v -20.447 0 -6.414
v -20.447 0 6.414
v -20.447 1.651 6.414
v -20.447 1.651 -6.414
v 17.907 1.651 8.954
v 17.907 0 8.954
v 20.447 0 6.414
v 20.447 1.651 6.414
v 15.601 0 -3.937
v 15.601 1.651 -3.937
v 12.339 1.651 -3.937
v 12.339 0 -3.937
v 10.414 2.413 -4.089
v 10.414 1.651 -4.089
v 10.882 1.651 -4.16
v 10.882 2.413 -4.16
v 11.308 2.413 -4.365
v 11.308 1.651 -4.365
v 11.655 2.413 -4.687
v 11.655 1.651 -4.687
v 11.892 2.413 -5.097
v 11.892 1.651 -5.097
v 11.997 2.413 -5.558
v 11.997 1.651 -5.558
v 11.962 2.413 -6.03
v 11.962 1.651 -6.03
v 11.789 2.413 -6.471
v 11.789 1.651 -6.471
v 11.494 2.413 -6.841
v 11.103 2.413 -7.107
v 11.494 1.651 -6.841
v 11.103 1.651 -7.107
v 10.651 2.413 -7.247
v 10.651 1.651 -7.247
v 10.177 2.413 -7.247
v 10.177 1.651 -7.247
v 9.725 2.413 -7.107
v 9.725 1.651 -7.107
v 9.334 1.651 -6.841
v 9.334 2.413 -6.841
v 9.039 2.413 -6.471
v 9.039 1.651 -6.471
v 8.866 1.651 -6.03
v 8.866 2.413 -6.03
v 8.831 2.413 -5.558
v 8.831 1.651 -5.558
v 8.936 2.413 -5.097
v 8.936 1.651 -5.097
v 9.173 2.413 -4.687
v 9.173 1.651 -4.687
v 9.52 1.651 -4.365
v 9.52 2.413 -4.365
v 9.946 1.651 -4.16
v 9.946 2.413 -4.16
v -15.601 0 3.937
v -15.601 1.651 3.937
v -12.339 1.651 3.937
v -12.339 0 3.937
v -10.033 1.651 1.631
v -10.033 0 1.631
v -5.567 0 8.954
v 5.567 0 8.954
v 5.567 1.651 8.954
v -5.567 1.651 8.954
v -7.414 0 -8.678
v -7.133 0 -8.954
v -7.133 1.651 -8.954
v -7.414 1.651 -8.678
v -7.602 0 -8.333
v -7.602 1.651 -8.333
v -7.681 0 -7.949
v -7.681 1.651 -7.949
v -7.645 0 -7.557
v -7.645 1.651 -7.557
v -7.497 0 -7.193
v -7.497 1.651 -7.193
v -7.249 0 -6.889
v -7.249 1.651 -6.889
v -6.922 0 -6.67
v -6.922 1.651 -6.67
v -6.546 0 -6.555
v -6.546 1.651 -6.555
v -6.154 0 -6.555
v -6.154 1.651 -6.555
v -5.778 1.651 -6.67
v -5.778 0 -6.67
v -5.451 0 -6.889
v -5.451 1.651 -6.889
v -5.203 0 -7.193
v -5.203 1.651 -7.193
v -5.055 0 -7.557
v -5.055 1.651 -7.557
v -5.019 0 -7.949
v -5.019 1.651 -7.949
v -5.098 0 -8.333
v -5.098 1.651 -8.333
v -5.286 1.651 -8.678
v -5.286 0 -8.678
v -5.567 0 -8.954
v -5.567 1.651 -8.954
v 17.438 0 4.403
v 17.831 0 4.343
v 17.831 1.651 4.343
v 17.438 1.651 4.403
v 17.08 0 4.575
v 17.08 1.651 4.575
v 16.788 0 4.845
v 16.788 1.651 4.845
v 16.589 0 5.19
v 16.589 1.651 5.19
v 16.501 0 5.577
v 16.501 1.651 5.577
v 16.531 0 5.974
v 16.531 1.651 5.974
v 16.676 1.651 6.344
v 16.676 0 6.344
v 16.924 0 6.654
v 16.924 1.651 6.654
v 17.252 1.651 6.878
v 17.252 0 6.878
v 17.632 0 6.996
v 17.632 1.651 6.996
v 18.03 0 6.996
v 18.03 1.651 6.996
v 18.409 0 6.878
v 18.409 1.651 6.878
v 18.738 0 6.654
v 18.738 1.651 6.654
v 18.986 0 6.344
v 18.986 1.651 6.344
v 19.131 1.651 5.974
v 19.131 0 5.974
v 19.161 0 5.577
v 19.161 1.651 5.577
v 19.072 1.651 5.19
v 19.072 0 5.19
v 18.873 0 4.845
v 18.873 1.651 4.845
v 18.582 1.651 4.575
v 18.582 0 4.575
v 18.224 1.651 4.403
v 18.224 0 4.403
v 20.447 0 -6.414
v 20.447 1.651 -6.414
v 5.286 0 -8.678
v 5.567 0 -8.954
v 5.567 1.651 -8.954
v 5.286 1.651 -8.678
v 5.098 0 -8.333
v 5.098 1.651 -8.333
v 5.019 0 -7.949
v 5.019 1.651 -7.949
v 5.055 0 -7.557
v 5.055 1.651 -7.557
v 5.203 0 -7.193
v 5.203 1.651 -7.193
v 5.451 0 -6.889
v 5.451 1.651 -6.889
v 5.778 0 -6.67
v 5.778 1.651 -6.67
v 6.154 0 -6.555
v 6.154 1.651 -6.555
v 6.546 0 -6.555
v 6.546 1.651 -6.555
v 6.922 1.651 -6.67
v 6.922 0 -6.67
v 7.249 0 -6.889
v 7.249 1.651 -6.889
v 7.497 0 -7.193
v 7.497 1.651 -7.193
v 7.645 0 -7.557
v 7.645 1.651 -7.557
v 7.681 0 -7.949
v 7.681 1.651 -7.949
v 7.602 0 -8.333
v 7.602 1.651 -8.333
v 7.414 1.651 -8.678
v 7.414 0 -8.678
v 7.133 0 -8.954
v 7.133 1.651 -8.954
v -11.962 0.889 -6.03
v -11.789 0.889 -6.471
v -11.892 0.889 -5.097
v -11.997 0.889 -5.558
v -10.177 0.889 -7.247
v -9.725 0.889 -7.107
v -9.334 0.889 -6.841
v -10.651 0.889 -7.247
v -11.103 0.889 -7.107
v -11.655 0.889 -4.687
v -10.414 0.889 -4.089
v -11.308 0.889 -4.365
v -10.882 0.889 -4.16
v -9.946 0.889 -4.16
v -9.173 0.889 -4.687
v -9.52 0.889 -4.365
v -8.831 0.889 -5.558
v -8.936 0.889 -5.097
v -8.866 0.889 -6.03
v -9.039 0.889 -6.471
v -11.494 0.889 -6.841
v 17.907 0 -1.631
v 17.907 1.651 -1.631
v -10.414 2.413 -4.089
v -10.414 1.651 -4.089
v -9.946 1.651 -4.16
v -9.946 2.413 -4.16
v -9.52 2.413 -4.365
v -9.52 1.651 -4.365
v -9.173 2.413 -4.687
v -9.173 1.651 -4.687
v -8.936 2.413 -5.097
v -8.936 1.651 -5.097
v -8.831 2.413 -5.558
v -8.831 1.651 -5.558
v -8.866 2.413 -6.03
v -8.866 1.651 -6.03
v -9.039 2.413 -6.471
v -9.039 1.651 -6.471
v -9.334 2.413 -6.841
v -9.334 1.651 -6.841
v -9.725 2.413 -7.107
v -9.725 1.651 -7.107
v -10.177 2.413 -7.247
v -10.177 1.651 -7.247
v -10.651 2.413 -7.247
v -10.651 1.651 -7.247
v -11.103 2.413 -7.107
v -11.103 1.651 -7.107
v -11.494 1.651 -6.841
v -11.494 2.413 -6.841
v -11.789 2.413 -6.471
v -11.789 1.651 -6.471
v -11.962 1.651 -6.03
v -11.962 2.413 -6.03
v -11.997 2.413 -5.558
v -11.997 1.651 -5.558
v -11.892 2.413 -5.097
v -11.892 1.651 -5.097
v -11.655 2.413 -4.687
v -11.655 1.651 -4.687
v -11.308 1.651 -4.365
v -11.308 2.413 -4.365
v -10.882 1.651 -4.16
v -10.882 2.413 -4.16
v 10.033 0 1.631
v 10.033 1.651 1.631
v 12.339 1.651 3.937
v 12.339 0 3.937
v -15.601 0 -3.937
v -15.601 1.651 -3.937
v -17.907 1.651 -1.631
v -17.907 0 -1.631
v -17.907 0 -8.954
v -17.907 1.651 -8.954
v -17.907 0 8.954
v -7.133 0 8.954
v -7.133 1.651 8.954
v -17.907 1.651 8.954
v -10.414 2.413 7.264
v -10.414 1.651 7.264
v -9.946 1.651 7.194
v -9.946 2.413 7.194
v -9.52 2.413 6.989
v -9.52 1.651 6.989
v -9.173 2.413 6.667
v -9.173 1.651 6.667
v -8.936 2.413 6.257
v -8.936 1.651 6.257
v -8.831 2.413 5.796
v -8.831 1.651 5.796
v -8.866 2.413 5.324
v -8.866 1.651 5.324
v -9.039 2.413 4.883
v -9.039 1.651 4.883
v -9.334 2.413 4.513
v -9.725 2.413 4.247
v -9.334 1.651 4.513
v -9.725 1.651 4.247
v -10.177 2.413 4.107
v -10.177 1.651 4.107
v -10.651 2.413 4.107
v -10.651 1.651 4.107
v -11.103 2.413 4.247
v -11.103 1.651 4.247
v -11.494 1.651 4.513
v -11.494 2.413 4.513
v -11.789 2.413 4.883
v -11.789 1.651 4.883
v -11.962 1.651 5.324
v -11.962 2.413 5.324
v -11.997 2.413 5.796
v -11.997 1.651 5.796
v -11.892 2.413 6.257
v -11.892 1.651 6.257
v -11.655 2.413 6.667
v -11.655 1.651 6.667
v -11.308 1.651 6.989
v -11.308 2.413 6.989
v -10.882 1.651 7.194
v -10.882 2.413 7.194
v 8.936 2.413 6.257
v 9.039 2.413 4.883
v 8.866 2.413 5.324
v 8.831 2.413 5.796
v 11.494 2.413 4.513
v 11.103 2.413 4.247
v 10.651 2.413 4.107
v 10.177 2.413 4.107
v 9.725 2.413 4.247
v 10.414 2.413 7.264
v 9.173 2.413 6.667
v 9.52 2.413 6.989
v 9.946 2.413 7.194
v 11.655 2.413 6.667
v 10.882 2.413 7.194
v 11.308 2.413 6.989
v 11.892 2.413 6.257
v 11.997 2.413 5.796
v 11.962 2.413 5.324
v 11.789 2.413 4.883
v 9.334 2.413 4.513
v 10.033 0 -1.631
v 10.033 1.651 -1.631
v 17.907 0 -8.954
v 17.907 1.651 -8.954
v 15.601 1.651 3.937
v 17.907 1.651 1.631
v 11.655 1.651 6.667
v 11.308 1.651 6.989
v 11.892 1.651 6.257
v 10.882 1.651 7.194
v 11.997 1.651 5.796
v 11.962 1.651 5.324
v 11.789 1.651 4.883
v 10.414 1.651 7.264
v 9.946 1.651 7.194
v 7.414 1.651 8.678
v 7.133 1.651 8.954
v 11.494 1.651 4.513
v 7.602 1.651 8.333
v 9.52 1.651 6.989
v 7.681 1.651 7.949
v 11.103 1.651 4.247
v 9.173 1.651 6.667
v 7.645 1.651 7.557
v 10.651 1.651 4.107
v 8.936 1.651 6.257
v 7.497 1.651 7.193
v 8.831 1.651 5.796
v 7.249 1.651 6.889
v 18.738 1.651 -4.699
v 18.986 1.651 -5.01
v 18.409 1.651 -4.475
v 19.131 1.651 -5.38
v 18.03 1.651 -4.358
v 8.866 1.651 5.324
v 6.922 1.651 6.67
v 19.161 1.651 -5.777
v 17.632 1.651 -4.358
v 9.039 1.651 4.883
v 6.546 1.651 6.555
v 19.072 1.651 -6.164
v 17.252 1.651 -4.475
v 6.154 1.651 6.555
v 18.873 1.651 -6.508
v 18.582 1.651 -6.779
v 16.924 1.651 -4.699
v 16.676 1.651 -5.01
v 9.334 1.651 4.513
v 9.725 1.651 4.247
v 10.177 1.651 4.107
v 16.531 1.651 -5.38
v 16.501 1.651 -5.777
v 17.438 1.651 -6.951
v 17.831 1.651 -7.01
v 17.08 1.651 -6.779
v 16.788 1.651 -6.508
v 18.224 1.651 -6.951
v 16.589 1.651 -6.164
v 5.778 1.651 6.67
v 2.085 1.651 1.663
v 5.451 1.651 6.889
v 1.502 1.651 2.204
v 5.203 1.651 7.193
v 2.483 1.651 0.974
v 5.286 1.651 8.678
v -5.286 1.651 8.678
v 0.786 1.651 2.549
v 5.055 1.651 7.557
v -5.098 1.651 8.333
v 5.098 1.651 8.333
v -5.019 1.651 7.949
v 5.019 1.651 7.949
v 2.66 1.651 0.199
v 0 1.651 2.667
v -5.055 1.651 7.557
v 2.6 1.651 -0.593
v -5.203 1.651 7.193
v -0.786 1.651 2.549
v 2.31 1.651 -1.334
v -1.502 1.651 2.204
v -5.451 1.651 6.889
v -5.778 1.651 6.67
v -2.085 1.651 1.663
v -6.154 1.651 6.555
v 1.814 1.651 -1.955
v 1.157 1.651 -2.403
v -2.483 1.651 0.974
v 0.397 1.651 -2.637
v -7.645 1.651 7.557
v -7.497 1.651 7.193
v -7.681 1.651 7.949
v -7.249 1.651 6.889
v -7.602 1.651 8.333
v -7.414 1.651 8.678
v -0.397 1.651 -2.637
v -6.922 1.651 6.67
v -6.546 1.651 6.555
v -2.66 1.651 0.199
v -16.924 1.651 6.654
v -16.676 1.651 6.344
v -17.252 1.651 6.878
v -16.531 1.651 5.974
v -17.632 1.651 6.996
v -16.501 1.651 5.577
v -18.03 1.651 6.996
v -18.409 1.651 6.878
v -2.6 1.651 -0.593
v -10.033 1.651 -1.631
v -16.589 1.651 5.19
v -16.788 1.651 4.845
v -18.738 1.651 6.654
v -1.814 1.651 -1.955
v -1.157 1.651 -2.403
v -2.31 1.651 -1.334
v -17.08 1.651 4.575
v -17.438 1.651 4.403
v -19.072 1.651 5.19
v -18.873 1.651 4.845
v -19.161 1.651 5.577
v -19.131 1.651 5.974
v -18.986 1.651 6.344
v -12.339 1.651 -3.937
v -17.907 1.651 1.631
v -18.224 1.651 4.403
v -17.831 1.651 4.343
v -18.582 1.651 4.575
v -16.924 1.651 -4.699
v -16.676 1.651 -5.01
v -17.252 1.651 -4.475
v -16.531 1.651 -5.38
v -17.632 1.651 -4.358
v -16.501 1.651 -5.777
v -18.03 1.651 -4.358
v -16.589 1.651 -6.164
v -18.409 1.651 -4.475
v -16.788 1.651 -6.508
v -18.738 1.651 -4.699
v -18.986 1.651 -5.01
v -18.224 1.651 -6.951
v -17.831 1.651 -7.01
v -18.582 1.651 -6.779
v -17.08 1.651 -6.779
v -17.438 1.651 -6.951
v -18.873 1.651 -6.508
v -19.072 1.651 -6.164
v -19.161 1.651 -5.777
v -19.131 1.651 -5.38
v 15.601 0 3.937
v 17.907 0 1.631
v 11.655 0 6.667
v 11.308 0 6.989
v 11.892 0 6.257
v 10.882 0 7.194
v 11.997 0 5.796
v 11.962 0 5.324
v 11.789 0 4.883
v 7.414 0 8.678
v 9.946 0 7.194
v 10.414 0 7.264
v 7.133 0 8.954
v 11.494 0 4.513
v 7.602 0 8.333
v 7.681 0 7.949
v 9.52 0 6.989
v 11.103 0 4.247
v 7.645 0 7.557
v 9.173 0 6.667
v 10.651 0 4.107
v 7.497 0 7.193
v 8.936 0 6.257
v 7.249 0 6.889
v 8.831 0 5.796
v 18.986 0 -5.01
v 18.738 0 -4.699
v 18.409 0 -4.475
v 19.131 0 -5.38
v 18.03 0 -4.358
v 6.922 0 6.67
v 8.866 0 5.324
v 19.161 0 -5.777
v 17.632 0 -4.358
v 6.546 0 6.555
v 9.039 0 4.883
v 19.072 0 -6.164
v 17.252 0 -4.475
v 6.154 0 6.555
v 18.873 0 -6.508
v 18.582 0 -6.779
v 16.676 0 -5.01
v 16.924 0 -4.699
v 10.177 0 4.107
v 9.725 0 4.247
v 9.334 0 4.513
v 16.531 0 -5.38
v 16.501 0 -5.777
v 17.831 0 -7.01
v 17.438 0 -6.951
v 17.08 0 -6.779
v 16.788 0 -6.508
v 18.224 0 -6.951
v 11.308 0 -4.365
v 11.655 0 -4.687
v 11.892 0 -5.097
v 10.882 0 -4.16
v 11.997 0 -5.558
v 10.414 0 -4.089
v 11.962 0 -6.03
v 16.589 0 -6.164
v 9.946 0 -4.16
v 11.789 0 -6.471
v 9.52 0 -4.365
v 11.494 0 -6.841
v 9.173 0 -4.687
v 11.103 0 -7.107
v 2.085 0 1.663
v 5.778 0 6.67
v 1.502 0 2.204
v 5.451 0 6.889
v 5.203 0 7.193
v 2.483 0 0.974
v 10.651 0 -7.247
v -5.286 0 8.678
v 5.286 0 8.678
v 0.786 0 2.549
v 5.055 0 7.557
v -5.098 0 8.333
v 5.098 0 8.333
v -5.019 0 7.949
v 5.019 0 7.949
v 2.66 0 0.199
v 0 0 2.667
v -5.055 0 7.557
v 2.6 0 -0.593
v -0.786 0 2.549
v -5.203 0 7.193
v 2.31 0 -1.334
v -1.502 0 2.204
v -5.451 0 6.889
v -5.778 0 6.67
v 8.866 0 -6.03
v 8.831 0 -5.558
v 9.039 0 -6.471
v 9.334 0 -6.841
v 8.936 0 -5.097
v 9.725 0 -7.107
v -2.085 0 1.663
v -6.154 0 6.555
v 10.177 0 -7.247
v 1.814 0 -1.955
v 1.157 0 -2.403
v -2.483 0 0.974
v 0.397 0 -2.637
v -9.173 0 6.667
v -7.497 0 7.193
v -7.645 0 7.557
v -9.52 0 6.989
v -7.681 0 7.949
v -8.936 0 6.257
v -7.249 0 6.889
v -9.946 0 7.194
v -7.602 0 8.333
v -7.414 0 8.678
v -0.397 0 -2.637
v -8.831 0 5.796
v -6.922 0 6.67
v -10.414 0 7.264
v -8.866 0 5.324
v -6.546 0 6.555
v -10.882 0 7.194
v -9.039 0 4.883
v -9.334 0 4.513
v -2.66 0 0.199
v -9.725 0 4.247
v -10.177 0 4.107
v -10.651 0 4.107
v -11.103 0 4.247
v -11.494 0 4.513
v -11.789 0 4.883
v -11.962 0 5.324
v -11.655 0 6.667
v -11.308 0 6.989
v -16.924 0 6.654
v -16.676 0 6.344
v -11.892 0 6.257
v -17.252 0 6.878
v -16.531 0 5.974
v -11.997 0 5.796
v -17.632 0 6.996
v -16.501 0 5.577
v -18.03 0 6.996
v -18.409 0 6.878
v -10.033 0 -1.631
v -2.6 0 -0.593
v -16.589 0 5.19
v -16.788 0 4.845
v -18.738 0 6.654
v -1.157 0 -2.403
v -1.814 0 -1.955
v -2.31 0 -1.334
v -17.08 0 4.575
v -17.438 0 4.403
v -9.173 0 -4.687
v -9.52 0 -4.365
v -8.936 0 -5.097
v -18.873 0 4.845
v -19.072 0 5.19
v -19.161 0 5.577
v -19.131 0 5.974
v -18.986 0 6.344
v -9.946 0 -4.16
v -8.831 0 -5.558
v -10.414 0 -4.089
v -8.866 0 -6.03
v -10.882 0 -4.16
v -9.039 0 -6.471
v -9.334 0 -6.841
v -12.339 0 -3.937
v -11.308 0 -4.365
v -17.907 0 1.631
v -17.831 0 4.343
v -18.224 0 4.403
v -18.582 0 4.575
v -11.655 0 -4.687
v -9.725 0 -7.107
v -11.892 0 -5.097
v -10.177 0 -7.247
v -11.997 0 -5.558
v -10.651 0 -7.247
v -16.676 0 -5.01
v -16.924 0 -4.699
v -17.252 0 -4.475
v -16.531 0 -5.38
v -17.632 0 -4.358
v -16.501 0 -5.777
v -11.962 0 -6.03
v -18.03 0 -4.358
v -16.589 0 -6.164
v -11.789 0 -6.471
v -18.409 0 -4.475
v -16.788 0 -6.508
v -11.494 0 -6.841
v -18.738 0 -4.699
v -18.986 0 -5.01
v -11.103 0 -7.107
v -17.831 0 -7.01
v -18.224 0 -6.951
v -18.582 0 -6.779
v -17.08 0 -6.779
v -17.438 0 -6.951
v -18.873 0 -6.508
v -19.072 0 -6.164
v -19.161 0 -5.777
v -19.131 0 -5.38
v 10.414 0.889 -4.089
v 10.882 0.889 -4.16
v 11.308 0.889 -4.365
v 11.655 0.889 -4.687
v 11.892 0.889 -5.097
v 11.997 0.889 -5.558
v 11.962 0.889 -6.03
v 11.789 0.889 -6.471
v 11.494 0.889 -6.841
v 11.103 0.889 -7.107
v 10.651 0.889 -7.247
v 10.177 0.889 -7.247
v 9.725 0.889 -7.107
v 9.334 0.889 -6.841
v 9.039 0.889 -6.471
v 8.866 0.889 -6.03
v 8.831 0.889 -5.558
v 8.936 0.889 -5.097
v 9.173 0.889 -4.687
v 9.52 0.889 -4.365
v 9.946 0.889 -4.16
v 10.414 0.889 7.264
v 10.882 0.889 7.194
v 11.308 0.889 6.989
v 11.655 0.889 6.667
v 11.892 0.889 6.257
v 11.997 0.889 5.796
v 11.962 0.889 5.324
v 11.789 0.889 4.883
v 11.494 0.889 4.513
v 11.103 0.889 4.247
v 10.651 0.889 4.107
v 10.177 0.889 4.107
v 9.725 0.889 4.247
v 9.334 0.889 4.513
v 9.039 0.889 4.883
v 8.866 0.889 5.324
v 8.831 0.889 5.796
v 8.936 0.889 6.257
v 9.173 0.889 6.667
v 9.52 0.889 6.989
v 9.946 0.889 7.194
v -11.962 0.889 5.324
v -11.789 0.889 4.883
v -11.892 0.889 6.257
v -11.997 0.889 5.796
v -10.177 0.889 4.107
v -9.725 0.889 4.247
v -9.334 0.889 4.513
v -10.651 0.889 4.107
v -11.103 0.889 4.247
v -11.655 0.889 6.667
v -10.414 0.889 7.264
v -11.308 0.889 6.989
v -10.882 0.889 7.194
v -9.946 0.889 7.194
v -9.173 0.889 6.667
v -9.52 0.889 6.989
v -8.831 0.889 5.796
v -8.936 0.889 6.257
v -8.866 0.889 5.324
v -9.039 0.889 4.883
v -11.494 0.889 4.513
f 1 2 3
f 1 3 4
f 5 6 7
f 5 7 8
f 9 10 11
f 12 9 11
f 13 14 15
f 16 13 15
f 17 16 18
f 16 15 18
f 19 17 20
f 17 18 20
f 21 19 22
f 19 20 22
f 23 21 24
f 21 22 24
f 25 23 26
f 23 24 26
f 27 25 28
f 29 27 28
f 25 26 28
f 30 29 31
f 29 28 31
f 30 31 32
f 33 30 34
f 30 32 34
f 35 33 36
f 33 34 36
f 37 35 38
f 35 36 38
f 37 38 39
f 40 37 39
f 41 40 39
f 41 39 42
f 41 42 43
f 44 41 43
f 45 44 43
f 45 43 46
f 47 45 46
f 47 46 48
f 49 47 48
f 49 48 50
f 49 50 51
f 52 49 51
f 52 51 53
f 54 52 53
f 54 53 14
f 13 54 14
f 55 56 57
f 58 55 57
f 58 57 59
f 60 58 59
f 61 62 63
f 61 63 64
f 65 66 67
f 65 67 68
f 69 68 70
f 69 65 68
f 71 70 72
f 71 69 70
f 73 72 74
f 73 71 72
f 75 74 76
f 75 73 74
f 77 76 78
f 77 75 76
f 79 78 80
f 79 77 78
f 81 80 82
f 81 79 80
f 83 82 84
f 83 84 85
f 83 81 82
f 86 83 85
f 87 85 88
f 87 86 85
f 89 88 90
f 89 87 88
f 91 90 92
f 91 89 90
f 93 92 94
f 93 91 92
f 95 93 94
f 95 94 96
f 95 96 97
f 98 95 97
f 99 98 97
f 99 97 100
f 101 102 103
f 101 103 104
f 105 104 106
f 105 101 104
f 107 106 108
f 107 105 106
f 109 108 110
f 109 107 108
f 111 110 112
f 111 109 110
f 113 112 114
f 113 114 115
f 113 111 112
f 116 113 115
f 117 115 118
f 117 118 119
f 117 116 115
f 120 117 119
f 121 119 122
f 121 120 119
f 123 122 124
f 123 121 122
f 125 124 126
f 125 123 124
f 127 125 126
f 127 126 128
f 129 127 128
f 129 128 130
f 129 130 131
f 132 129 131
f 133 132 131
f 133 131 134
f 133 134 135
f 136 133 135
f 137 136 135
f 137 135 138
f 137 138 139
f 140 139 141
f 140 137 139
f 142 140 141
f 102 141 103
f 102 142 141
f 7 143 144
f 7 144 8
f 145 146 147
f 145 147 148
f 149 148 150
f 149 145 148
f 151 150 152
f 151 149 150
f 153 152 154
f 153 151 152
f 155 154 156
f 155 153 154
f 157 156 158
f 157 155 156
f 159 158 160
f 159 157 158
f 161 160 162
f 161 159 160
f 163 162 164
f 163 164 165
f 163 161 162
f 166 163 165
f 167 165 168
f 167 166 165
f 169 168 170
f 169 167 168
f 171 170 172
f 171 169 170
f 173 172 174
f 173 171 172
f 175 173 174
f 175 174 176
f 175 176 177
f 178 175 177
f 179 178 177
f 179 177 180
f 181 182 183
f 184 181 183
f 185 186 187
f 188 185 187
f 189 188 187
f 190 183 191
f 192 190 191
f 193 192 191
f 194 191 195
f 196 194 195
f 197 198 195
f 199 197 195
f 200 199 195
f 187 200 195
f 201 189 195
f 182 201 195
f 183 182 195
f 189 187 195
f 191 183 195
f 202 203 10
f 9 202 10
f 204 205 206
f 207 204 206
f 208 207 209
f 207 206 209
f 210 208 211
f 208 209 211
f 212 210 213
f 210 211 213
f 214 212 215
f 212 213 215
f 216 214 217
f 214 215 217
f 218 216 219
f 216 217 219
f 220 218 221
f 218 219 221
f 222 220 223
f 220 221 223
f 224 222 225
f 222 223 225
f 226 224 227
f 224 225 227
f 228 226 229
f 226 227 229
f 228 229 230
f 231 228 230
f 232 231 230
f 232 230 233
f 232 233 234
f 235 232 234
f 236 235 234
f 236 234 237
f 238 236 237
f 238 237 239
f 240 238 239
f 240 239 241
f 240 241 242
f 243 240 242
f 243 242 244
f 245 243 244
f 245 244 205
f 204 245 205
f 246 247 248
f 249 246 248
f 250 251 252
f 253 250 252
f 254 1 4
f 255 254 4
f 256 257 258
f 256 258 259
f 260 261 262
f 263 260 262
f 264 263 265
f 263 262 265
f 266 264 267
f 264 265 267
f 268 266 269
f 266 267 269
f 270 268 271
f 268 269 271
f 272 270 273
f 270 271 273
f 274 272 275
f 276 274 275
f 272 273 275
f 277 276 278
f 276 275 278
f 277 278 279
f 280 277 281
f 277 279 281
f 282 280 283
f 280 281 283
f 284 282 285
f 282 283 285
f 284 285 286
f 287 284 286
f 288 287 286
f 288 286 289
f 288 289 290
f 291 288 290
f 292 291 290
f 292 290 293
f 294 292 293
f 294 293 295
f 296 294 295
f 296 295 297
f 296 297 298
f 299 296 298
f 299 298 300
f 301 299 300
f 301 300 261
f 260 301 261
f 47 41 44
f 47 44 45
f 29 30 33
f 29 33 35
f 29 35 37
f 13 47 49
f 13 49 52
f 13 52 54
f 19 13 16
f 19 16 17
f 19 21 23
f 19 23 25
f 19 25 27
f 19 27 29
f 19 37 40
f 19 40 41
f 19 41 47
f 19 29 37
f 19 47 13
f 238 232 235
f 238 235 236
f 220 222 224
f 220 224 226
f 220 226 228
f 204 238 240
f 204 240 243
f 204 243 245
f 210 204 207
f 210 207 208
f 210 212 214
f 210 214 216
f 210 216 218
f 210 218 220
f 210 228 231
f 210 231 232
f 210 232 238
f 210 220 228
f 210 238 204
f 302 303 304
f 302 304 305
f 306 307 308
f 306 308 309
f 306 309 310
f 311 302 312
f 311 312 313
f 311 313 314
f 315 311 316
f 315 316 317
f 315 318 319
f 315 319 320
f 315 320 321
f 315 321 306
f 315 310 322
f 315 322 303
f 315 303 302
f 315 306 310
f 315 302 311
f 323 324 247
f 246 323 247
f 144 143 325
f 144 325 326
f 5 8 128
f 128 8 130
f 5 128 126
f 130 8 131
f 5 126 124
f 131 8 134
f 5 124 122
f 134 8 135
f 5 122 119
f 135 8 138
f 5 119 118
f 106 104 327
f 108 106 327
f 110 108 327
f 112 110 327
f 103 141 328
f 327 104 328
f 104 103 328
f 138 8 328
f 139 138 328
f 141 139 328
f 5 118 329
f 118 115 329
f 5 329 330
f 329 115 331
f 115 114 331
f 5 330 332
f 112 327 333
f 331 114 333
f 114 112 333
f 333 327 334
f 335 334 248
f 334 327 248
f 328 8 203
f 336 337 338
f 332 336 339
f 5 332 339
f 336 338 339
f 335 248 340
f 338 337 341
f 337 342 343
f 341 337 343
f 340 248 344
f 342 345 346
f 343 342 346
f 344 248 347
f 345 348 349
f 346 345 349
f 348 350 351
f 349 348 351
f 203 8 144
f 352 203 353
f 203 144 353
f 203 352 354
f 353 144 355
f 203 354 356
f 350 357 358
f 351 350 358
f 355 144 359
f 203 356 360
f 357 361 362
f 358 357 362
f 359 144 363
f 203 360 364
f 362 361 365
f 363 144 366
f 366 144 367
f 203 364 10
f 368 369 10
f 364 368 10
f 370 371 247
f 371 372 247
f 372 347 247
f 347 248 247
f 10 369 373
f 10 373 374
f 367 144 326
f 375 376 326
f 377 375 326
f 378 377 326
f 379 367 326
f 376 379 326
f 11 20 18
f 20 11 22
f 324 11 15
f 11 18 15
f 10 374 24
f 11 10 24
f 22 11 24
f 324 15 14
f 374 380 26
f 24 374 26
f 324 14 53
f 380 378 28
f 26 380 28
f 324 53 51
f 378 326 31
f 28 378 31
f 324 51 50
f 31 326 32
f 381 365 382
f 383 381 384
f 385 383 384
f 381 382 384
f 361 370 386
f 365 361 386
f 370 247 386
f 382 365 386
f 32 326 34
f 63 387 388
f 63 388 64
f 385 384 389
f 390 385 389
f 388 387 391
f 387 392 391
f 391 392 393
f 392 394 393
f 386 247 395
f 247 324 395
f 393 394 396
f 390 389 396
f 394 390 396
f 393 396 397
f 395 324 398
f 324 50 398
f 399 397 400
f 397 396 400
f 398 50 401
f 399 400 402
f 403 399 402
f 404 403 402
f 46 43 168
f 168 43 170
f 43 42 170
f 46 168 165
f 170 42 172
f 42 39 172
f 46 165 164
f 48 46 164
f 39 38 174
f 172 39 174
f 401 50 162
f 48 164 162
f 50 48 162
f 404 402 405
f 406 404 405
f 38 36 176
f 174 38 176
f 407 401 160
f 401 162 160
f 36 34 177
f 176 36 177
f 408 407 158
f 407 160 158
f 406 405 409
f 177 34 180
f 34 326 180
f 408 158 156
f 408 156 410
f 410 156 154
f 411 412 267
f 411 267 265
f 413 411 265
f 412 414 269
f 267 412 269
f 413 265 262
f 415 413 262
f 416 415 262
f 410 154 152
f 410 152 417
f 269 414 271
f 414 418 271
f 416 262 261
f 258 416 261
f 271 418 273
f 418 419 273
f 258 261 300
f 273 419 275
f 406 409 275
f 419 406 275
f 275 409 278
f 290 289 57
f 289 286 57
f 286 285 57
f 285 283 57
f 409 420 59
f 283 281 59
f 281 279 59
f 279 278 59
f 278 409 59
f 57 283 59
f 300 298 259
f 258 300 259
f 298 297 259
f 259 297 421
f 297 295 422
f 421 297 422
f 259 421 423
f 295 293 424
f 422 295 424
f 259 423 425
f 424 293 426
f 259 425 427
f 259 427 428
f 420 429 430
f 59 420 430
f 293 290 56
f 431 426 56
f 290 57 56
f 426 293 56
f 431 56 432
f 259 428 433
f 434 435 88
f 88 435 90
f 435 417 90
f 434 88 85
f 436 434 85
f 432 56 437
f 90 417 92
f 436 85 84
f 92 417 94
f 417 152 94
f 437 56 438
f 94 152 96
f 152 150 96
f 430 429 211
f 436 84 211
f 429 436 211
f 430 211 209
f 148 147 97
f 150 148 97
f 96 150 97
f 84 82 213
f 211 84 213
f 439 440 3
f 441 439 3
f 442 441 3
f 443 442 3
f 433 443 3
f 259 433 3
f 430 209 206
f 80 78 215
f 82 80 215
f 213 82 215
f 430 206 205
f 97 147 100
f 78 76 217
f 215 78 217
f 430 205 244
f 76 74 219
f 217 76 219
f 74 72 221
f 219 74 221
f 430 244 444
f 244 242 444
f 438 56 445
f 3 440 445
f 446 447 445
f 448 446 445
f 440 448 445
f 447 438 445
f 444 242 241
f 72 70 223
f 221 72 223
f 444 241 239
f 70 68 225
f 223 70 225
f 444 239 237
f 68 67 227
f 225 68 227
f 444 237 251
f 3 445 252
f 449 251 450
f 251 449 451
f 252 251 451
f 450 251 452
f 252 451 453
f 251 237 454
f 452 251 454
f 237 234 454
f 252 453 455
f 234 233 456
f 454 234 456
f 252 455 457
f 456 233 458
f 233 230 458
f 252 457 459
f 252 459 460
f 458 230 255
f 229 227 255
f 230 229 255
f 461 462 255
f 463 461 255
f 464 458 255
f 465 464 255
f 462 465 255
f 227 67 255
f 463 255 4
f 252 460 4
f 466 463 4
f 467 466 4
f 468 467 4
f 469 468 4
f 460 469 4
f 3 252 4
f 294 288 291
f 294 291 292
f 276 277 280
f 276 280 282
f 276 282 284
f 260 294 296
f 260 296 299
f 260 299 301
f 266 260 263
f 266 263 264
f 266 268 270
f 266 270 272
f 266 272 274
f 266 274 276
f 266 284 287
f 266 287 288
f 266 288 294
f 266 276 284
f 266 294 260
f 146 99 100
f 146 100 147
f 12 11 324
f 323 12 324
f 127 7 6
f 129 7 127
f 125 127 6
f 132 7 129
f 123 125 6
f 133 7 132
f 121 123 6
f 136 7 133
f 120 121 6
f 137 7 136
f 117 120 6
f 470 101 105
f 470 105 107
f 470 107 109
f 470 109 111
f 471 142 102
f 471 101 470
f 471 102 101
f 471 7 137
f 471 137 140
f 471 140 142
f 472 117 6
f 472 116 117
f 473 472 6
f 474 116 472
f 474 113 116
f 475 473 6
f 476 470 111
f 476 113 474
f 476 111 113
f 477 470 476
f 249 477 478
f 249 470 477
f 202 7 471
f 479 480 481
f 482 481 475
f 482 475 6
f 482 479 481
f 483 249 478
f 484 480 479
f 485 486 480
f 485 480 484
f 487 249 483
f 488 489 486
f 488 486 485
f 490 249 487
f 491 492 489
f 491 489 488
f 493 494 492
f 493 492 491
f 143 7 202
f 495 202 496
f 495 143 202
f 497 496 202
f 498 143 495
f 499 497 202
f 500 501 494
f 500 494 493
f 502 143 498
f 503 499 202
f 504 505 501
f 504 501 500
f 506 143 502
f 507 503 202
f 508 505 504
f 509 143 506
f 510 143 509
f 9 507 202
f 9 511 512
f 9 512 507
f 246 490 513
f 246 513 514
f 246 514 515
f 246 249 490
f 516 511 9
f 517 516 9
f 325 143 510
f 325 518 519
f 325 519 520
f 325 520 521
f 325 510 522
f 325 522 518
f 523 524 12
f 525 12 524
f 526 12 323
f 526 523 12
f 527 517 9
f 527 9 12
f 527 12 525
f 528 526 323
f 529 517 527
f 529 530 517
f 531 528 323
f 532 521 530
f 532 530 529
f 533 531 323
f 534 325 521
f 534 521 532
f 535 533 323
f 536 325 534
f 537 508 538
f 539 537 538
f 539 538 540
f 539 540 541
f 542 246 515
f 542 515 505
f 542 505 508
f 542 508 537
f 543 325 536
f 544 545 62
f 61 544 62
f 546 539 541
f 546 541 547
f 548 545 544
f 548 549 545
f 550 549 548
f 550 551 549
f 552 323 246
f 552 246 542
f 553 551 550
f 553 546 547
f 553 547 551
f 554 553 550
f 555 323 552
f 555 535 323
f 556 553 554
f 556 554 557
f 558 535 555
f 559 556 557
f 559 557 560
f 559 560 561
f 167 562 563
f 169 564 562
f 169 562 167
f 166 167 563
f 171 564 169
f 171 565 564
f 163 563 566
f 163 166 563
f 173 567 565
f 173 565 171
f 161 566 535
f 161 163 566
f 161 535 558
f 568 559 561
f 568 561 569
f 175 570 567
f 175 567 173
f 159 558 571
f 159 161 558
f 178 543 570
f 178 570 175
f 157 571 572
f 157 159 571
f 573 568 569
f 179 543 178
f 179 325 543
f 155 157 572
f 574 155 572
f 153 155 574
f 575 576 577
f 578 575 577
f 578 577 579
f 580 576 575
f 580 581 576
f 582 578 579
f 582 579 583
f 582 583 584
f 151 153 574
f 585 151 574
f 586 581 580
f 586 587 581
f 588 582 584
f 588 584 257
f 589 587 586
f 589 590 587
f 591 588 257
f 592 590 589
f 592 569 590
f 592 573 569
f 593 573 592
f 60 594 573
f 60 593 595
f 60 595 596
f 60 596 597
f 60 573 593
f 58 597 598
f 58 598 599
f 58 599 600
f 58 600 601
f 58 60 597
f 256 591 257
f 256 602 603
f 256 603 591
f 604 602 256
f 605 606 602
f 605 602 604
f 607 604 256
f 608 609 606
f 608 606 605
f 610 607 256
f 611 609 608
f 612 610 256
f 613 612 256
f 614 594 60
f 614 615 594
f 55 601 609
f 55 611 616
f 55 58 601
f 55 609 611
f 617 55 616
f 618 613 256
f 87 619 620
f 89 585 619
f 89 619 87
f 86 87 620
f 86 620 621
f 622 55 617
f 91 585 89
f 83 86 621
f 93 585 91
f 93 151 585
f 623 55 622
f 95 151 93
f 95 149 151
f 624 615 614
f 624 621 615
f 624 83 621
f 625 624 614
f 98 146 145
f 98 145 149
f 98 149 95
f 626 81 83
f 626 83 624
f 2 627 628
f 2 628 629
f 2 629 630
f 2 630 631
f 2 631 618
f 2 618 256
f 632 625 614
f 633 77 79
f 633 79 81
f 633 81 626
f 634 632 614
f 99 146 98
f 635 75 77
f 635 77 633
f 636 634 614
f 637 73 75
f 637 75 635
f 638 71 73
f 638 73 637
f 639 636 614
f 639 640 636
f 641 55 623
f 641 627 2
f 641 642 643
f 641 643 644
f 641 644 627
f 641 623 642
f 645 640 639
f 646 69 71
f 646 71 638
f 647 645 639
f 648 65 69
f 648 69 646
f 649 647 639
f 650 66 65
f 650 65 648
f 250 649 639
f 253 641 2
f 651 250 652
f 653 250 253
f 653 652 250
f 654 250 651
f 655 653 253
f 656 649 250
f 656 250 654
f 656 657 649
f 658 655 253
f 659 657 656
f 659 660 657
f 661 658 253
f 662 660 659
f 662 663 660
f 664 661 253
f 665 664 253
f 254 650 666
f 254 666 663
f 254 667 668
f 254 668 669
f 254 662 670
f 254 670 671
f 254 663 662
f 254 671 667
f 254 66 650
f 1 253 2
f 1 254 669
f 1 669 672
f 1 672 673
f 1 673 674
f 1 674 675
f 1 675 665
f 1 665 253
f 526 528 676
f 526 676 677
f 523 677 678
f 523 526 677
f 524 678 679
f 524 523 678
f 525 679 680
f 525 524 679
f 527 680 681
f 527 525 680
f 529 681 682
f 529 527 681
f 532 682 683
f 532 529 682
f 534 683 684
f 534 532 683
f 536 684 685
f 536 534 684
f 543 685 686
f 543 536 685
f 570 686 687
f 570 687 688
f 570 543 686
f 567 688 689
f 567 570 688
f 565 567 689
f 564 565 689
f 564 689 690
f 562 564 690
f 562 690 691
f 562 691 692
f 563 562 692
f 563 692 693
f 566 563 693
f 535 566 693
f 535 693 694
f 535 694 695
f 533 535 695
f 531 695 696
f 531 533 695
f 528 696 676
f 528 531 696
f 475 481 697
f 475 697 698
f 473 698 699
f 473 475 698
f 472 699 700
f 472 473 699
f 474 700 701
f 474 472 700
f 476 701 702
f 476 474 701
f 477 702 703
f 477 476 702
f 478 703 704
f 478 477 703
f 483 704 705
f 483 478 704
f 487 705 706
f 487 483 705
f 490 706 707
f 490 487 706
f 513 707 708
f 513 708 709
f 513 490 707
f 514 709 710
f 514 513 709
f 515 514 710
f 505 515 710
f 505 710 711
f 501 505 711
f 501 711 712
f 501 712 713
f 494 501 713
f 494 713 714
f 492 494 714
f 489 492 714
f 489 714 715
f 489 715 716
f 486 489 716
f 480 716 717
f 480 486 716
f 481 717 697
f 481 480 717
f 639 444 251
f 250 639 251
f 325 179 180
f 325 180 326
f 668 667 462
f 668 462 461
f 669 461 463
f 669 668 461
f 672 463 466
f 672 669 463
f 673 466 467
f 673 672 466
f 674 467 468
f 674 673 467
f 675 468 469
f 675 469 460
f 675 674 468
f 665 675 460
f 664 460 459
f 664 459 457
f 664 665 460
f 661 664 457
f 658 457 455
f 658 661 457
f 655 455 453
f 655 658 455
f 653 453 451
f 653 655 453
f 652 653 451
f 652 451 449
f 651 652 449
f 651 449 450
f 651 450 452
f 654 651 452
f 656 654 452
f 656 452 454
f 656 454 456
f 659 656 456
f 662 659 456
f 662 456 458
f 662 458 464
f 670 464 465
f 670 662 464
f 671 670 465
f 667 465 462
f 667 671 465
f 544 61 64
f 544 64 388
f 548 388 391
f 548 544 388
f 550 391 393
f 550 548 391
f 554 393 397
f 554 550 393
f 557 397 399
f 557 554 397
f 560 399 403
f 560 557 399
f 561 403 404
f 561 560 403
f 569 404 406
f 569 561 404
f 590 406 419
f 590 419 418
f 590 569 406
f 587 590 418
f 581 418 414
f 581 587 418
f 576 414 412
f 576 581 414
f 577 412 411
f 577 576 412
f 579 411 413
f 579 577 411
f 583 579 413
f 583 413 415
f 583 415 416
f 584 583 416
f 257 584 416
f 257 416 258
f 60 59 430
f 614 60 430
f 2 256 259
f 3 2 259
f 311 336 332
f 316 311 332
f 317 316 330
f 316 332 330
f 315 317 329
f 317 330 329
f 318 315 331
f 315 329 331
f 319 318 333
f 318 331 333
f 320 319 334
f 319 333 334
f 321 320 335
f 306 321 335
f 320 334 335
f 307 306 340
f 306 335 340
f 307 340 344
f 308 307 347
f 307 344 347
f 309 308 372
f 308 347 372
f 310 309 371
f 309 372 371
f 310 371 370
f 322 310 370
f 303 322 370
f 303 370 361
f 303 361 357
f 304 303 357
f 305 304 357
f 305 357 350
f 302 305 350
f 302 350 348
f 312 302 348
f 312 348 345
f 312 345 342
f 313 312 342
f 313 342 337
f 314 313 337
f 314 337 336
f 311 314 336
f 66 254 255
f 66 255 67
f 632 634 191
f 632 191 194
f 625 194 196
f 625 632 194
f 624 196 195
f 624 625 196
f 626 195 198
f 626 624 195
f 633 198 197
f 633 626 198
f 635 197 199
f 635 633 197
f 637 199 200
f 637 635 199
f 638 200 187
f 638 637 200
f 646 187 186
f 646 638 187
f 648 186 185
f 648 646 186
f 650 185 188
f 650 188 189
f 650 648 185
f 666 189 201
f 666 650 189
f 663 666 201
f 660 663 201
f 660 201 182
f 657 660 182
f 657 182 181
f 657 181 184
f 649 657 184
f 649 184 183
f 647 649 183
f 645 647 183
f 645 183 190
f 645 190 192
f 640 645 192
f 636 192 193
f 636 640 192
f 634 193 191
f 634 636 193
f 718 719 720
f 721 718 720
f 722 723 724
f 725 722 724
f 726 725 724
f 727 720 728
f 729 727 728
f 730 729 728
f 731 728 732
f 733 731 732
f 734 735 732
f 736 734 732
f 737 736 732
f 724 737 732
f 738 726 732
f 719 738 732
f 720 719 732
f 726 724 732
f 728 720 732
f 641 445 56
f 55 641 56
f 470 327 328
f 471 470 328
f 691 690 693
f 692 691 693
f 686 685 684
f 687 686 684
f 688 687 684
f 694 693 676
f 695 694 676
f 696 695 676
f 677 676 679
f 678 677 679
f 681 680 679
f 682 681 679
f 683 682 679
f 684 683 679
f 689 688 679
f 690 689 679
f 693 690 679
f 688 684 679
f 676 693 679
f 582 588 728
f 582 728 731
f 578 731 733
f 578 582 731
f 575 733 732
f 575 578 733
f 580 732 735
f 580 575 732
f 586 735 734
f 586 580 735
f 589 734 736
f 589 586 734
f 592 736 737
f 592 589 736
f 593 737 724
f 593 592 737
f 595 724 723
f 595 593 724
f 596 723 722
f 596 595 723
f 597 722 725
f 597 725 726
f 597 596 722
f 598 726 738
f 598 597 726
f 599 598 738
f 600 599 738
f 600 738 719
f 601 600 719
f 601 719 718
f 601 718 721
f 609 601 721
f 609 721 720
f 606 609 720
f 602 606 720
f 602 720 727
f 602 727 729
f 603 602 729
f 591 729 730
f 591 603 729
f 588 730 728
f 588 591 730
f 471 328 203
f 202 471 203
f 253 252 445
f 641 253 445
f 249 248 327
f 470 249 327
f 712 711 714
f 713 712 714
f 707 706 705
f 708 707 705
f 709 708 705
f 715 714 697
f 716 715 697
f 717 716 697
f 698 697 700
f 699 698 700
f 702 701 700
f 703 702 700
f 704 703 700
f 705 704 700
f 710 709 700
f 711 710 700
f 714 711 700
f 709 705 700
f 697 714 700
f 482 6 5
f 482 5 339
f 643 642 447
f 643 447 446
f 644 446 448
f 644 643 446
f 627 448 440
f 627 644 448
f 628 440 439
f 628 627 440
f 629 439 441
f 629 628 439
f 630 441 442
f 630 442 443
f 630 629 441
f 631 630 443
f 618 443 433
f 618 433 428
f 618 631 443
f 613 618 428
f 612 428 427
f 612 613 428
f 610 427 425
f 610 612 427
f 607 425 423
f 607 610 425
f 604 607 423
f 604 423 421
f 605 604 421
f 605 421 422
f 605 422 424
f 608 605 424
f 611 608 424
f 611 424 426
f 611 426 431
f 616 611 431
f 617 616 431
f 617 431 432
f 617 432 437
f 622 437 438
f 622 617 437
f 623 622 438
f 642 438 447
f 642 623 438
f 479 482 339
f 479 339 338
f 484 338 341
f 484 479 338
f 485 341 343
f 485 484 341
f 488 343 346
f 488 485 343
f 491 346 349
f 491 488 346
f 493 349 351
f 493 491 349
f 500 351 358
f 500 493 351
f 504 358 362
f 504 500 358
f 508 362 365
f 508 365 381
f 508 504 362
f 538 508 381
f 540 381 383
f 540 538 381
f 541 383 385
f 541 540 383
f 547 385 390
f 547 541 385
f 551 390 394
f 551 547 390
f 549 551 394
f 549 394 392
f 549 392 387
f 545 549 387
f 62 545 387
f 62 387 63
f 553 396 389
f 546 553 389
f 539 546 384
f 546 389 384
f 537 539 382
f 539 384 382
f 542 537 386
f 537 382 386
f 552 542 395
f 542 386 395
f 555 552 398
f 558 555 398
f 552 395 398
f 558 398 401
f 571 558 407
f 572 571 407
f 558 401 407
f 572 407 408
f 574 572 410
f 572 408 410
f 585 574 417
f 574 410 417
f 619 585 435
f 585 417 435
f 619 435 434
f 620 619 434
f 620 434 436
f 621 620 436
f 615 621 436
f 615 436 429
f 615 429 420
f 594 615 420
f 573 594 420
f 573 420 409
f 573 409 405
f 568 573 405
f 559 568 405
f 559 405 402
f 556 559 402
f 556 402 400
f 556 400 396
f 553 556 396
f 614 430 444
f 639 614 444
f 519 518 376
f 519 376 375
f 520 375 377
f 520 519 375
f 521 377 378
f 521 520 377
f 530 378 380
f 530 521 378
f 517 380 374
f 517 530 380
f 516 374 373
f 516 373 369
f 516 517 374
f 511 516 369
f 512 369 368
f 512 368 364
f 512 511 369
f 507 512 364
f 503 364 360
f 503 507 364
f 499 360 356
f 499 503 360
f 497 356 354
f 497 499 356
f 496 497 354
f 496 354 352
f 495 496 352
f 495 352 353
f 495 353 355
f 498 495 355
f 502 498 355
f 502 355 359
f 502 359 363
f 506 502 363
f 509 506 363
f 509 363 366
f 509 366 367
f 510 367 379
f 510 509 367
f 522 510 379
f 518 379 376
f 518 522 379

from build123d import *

# Parameters (mm, degrees)
SKETCH1_R           = 1.3335
SKETCH1_R_2         = 1.5875
BOSS_EXTRUDE1_DEPTH = 1.651
CHAMFER1_SIZE       = 2.54
SKETCH1_2_R         = 1.5875
BOSS_EXTRUDE2_DEPTH = 2.413
SKETCH1_3_R         = 1.5875
CUT_EXTRUDE1_DEPTH  = 0.889
SKETCH3_R           = 2.667
CUT_EXTRUDE3_DEPTH  = 23.382376376


with BuildPart() as part:
    # Sketch1 → Boss-Extrude1 (new body)
    with BuildSketch(Plane(origin=(0, 0, 0), x_dir=(1, 0, 0), z_dir=(0, 1, 0))):
        with BuildLine():
            Line((-5.567119422, 8.9535), (5.567119422, 8.9535))
            ThreePointArc((5.567119422, 8.9535), (6.35, 6.5405), (7.132880578, 8.9535))
            Line((7.132880578, 8.9535), (20.447, 8.9535))
            Line((20.447, 8.9535), (20.447, -8.9535))
            Line((20.447, -8.9535), (7.132880578, -8.9535))
            ThreePointArc((7.132880578, -8.9535), (6.35, -6.5405), (5.567119422, -8.9535))
            Line((5.567119422, -8.9535), (-5.567119422, -8.9535))
            ThreePointArc((-5.567119422, -8.9535), (-6.35, -6.5405), (-7.132880578, -8.9535))
            Line((-7.132880578, -8.9535), (-20.447, -8.9535))
            Line((-20.447, -8.9535), (-20.447, 8.9535))
            Line((-20.447, 8.9535), (-7.132880578, 8.9535))
            ThreePointArc((-7.132880578, 8.9535), (-6.35, 6.5405), (-5.567119422, 8.9535))
        make_face()
        with Locations((-17.8308, 5.6769)):
            Circle(SKETCH1_R, mode=Mode.SUBTRACT)
        with Locations((17.8308, 5.6769)):
            Circle(SKETCH1_R, mode=Mode.SUBTRACT)
        with Locations((17.8308, -5.6769)):
            Circle(SKETCH1_R, mode=Mode.SUBTRACT)
        with Locations((-17.8308, -5.6769)):
            Circle(SKETCH1_R, mode=Mode.SUBTRACT)
        with Locations((-10.414, 5.6769)):
            Circle(SKETCH1_R_2, mode=Mode.SUBTRACT)
        with Locations((10.414, 5.6769)):
            Circle(SKETCH1_R_2, mode=Mode.SUBTRACT)
        with Locations((10.414, -5.6769)):
            Circle(SKETCH1_R_2, mode=Mode.SUBTRACT)
        with Locations((-10.414, -5.6769)):
            Circle(SKETCH1_R_2, mode=Mode.SUBTRACT)
    extrude(amount=BOSS_EXTRUDE1_DEPTH)

    # Chamfer1
    chamfer1_edges = [part.edges().sort_by_distance(p)[0] for p in [
        (-20.447, 0.8255, 8.9535),
        (-20.447, 0.8255, -8.9535),
        (20.447, 0.8255, -8.9535),
        (20.447, 0.8255, 8.9535),
    ]]
    chamfer(chamfer1_edges, length=CHAMFER1_SIZE)

    # Sketch1<2> → Boss-Extrude2 (add)
    with BuildSketch(Plane(origin=(0, 0, 0), x_dir=(1, 0, 0), z_dir=(0, 1, 0))):
        with Locations((-10.414, 5.6769)):
            Circle(SKETCH1_2_R)
        with Locations((10.414, 5.6769)):
            Circle(SKETCH1_2_R)
        with Locations((10.414, -5.6769)):
            Circle(SKETCH1_2_R)
        with Locations((-10.414, -5.6769)):
            Circle(SKETCH1_2_R)
    extrude(amount=BOSS_EXTRUDE2_DEPTH)

    # Sketch1<3> → Cut-Extrude1 (cut)
    with BuildSketch(Plane(origin=(0, 0, 0), x_dir=(1, 0, 0), z_dir=(0, 1, 0))):
        with Locations((-10.414, 5.6769)):
            Circle(SKETCH1_3_R)
        with Locations((10.414, 5.6769)):
            Circle(SKETCH1_3_R)
        with Locations((10.414, -5.6769)):
            Circle(SKETCH1_3_R)
        with Locations((-10.414, -5.6769)):
            Circle(SKETCH1_3_R)
    extrude(amount=CUT_EXTRUDE1_DEPTH, mode=Mode.SUBTRACT)

    # Sketch3 → Cut-Extrude3 (cut, through all)
    with BuildSketch(Plane(origin=(0, 1.651, 0), x_dir=(1, 0, 0), z_dir=(0, 1, 0))):
        Circle(SKETCH3_R)
        Polygon((-10.033, 1.630758795), (-12.339241205, 3.937), (-15.600758795, 3.937), (-17.907, 1.630758795), (-17.907, -1.630758795), (-15.600758795, -3.937), (-12.339241205, -3.937), (-10.033, -1.630758795), align=None)
        Polygon((17.907, 1.630758795), (15.600758795, 3.937), (12.339241205, 3.937), (10.033, 1.630758795), (10.033, -1.630758795), (12.339241205, -3.937), (15.600758795, -3.937), (17.907, -1.630758795), align=None)
    extrude(amount=-CUT_EXTRUDE3_DEPTH, mode=Mode.SUBTRACT)


solid = part.part
